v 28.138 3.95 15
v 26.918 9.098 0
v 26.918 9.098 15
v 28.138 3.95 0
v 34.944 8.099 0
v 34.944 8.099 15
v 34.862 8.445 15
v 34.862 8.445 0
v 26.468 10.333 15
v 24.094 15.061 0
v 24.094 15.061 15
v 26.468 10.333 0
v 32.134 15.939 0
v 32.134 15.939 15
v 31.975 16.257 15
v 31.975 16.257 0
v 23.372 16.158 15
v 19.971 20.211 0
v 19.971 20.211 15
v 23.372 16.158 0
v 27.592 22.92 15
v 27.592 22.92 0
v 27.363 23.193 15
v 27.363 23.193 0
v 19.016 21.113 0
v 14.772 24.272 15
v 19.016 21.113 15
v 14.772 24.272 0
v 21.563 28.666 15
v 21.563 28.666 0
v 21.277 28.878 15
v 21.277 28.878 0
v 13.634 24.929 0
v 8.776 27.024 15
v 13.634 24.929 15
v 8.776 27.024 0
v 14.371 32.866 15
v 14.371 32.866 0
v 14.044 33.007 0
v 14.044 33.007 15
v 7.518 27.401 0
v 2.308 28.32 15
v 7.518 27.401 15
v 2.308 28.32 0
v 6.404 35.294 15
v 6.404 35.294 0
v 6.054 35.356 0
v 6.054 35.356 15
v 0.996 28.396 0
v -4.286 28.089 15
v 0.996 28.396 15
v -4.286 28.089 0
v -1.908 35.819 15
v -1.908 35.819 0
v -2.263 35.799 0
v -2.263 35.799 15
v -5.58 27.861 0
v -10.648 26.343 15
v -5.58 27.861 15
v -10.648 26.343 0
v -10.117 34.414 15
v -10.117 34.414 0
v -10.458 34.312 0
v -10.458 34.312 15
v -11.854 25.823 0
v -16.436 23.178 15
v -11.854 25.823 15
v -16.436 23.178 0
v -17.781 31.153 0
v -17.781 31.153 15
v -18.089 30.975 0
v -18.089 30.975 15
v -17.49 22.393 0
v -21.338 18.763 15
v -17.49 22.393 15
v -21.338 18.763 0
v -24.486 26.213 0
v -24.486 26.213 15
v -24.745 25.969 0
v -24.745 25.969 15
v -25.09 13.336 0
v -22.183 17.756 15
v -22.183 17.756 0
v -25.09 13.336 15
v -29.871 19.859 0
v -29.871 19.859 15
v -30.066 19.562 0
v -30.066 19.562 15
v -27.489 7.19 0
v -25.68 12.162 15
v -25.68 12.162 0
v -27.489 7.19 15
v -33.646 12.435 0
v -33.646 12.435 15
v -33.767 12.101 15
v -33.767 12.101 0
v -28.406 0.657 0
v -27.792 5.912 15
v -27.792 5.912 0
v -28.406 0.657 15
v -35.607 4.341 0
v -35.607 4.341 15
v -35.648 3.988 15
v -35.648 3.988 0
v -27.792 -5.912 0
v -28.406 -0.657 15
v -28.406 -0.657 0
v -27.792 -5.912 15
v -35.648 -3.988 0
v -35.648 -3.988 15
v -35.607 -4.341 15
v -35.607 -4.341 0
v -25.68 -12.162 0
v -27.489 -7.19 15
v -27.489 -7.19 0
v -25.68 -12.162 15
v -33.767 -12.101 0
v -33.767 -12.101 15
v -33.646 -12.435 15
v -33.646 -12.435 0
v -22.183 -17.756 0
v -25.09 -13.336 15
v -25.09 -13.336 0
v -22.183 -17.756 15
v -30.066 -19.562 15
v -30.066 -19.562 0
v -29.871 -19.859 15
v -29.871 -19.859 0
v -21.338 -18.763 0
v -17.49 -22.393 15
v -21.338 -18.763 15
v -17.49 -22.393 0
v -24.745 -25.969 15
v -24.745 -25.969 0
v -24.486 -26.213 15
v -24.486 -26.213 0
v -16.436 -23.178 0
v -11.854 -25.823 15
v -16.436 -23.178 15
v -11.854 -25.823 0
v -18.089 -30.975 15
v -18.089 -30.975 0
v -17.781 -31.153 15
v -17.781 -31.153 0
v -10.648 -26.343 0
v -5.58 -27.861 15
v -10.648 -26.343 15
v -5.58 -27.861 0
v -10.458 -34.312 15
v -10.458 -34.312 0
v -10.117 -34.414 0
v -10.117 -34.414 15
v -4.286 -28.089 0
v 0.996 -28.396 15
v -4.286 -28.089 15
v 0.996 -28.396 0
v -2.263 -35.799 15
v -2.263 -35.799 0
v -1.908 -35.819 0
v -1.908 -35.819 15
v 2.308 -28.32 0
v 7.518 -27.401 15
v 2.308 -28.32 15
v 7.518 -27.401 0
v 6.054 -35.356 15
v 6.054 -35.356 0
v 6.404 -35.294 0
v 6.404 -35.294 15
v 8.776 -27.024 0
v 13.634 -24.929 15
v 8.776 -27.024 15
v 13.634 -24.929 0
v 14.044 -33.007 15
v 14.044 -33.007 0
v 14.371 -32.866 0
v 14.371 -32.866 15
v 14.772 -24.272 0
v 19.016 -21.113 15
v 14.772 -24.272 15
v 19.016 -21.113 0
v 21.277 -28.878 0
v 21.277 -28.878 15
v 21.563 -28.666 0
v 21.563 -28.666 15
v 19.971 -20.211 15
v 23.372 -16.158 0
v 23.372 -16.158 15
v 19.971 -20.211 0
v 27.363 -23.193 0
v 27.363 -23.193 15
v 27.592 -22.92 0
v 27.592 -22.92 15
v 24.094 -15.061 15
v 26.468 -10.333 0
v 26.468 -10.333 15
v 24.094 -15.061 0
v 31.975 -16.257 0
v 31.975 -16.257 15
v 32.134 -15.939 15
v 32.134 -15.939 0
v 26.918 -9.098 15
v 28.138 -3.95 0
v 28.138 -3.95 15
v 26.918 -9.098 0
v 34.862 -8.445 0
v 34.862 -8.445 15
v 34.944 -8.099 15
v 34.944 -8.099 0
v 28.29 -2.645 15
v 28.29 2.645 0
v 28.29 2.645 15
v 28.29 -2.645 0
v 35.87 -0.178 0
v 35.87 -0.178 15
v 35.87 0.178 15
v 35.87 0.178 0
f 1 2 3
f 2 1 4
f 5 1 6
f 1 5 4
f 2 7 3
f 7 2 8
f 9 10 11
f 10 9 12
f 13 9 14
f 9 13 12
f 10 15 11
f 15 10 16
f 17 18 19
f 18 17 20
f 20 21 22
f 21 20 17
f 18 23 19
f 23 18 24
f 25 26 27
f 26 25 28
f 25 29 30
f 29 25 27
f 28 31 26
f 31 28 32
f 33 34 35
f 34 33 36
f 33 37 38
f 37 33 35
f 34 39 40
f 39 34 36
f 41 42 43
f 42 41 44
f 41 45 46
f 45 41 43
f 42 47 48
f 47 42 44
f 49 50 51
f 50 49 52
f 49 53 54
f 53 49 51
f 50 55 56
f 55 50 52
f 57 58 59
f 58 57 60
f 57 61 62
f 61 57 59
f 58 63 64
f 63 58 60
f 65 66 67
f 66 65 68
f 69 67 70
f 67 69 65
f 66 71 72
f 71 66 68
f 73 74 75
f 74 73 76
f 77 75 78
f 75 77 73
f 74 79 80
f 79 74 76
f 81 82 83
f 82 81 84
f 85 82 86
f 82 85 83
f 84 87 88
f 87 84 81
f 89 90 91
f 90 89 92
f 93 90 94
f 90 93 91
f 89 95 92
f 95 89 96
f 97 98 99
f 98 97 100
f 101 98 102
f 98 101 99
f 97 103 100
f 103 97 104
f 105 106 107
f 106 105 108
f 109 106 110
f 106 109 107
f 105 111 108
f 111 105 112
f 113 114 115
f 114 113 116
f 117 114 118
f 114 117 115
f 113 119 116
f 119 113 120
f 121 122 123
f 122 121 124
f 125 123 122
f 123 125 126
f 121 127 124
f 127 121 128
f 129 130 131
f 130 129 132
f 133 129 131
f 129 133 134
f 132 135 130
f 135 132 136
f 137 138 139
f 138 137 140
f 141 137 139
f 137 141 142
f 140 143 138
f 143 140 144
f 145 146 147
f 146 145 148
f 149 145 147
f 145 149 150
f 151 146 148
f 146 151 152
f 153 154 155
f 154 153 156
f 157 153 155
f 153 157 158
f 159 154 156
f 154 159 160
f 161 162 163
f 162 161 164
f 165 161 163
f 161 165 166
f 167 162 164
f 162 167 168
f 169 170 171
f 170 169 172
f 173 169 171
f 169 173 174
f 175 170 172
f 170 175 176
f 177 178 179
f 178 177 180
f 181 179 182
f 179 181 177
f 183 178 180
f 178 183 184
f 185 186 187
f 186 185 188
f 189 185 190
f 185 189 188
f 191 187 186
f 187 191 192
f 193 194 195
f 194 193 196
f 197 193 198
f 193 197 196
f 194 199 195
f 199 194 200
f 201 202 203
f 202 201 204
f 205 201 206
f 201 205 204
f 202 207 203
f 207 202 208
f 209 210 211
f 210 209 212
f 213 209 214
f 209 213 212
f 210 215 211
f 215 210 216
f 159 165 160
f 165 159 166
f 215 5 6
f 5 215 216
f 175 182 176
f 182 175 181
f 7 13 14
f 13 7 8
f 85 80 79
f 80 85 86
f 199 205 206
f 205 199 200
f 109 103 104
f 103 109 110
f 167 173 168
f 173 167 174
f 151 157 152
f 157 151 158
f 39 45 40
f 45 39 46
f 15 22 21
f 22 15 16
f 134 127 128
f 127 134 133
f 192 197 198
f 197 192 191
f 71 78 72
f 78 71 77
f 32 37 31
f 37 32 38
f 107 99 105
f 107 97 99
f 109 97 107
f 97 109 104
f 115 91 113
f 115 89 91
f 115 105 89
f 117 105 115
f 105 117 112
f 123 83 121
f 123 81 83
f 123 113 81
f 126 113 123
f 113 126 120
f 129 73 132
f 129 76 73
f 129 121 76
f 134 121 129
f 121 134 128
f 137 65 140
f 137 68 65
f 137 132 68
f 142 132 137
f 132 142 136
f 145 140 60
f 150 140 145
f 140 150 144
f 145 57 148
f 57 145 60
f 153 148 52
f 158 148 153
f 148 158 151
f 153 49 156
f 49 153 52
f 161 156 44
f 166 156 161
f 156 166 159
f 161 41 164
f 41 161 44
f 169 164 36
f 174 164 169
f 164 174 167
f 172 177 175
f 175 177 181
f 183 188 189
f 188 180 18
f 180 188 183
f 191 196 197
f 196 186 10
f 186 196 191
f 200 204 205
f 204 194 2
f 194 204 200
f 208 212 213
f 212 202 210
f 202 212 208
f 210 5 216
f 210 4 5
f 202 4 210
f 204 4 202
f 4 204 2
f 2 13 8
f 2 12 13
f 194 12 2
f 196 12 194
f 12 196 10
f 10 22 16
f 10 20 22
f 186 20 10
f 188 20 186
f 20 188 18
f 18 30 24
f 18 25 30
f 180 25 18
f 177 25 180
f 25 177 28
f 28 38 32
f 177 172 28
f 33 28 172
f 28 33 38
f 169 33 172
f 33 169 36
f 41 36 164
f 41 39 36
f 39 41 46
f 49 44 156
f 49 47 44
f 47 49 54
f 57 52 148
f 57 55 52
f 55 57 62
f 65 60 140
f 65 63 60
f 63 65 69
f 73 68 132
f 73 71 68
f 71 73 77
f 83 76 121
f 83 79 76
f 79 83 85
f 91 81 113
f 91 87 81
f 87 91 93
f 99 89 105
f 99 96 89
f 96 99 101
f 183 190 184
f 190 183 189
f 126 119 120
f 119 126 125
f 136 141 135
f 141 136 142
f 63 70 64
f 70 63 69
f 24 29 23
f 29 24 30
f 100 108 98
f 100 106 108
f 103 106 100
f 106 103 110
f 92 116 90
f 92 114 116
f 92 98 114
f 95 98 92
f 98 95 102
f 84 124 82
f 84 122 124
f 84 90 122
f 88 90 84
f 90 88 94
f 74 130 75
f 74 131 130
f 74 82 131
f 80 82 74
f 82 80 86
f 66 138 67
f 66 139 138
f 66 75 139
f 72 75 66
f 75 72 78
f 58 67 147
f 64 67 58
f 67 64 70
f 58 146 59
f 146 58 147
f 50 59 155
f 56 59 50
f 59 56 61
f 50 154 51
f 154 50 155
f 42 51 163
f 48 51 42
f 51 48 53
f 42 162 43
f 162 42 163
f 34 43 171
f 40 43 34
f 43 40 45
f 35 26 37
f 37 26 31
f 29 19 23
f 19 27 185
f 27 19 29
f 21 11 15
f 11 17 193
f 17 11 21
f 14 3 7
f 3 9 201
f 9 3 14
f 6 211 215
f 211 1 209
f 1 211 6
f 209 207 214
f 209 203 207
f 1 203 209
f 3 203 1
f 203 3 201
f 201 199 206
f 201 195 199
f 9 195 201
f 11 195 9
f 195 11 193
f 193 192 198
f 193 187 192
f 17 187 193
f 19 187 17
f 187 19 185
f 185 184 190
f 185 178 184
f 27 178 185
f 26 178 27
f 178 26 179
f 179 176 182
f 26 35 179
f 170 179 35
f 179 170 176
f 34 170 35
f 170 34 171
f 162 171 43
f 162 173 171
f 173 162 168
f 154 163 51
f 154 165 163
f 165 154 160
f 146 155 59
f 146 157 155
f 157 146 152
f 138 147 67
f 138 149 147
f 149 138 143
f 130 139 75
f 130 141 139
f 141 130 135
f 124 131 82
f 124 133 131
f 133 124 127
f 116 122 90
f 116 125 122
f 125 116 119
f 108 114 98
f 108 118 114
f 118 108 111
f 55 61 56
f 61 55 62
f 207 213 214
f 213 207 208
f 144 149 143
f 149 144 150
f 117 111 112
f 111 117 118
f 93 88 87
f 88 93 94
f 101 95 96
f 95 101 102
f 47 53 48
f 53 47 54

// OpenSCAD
// [FL_INDEX: keywords="openscad, 3d_parametric, Stretchy_Bracelet, csg_solid" | COT="Parametric OpenSCAD design from 3DCodeverse"]
// Title: Stretchy Bracelet

// stretchy bracelet

r2=30;// major radius
h=8;// thickness (difference in radius between inside and outside
w=15;// width
t=0.4;// layer width and gap width
n=20;// number of twisty shapes around the circle
m=27;// number of bendy parts around the circle

pi=3.14159;
rr=pi*r2/n;
r1=rr*1.5;
ro=r2+(r1+rr)*0.5;
ri=ro-h;
a=pi*2*ri/m-t;
echo("Inside Diameter = ",2*ri);

solid();
//hollow();

module solid(){
difference(){
	// Uncomment one of these three lines for different styles
	//base(r1=r1,w=w);// original angled cording
	//base1(r1=r1,w=w);// horizontal cording
	cylinder(r=ro,h=w,$fn=m);// flat

	for(i=[1:m])rotate([0,0,i*360/m])
		translate([0,0,-0.03])linear_extrude(height=w+0.06)
			polygon(points=[[ri+t,a/2-t],[ri+t,t-a/2],[ro+t*h/a,0]],paths=[[0,1,2]]);
}}

module hollow(){
difference(){
	base(r1=r1,w=w);
	difference(){
		translate([0,0,-0.01])base(r1=r1-t,w=w+0.02);
		for(i=[1:m])rotate([0,0,i*360/m])
			translate([0,0,-0.02])linear_extrude(height=w+0.04)
				polygon(points=[[ri,a/2],[ri,-a/2],[ro+3*t*h/a,0]],paths=[[0,1,2]]);
	}
	for(i=[1:m])rotate([0,0,i*360/m])
		translate([0,0,-0.03])linear_extrude(height=w+0.06)
			polygon(points=[[ri+t,a/2-t],[ri+t,t-a/2],[ro+t*h/a,0]],paths=[[0,1,2]]);
}}

module base(r1,w){
render()
union(){	
	cylinder(r=r2+rr*0.5,h=w);
	for(i=[1:n]){
		rotate([0,0,i*360/n])translate([0,-r2,0])
		scale([1,0.5,1])linear_extrude(height=w,twist=180,slices=10)
			translate([rr,0,0])circle(r=r1,$fn=20);
	}
}}

module base1(r1,w){
union(){	
	cylinder(r=ro-1.5,h=w,$fn=100);
	for(i=[1:3]){
		translate([0,0,(i-1)*4.5+3])scale([1,1,2])rotate_extrude($fn=100)
			translate([ro-1.5,0,0])circle(r=1.5,$fn=20);
	}
}}
